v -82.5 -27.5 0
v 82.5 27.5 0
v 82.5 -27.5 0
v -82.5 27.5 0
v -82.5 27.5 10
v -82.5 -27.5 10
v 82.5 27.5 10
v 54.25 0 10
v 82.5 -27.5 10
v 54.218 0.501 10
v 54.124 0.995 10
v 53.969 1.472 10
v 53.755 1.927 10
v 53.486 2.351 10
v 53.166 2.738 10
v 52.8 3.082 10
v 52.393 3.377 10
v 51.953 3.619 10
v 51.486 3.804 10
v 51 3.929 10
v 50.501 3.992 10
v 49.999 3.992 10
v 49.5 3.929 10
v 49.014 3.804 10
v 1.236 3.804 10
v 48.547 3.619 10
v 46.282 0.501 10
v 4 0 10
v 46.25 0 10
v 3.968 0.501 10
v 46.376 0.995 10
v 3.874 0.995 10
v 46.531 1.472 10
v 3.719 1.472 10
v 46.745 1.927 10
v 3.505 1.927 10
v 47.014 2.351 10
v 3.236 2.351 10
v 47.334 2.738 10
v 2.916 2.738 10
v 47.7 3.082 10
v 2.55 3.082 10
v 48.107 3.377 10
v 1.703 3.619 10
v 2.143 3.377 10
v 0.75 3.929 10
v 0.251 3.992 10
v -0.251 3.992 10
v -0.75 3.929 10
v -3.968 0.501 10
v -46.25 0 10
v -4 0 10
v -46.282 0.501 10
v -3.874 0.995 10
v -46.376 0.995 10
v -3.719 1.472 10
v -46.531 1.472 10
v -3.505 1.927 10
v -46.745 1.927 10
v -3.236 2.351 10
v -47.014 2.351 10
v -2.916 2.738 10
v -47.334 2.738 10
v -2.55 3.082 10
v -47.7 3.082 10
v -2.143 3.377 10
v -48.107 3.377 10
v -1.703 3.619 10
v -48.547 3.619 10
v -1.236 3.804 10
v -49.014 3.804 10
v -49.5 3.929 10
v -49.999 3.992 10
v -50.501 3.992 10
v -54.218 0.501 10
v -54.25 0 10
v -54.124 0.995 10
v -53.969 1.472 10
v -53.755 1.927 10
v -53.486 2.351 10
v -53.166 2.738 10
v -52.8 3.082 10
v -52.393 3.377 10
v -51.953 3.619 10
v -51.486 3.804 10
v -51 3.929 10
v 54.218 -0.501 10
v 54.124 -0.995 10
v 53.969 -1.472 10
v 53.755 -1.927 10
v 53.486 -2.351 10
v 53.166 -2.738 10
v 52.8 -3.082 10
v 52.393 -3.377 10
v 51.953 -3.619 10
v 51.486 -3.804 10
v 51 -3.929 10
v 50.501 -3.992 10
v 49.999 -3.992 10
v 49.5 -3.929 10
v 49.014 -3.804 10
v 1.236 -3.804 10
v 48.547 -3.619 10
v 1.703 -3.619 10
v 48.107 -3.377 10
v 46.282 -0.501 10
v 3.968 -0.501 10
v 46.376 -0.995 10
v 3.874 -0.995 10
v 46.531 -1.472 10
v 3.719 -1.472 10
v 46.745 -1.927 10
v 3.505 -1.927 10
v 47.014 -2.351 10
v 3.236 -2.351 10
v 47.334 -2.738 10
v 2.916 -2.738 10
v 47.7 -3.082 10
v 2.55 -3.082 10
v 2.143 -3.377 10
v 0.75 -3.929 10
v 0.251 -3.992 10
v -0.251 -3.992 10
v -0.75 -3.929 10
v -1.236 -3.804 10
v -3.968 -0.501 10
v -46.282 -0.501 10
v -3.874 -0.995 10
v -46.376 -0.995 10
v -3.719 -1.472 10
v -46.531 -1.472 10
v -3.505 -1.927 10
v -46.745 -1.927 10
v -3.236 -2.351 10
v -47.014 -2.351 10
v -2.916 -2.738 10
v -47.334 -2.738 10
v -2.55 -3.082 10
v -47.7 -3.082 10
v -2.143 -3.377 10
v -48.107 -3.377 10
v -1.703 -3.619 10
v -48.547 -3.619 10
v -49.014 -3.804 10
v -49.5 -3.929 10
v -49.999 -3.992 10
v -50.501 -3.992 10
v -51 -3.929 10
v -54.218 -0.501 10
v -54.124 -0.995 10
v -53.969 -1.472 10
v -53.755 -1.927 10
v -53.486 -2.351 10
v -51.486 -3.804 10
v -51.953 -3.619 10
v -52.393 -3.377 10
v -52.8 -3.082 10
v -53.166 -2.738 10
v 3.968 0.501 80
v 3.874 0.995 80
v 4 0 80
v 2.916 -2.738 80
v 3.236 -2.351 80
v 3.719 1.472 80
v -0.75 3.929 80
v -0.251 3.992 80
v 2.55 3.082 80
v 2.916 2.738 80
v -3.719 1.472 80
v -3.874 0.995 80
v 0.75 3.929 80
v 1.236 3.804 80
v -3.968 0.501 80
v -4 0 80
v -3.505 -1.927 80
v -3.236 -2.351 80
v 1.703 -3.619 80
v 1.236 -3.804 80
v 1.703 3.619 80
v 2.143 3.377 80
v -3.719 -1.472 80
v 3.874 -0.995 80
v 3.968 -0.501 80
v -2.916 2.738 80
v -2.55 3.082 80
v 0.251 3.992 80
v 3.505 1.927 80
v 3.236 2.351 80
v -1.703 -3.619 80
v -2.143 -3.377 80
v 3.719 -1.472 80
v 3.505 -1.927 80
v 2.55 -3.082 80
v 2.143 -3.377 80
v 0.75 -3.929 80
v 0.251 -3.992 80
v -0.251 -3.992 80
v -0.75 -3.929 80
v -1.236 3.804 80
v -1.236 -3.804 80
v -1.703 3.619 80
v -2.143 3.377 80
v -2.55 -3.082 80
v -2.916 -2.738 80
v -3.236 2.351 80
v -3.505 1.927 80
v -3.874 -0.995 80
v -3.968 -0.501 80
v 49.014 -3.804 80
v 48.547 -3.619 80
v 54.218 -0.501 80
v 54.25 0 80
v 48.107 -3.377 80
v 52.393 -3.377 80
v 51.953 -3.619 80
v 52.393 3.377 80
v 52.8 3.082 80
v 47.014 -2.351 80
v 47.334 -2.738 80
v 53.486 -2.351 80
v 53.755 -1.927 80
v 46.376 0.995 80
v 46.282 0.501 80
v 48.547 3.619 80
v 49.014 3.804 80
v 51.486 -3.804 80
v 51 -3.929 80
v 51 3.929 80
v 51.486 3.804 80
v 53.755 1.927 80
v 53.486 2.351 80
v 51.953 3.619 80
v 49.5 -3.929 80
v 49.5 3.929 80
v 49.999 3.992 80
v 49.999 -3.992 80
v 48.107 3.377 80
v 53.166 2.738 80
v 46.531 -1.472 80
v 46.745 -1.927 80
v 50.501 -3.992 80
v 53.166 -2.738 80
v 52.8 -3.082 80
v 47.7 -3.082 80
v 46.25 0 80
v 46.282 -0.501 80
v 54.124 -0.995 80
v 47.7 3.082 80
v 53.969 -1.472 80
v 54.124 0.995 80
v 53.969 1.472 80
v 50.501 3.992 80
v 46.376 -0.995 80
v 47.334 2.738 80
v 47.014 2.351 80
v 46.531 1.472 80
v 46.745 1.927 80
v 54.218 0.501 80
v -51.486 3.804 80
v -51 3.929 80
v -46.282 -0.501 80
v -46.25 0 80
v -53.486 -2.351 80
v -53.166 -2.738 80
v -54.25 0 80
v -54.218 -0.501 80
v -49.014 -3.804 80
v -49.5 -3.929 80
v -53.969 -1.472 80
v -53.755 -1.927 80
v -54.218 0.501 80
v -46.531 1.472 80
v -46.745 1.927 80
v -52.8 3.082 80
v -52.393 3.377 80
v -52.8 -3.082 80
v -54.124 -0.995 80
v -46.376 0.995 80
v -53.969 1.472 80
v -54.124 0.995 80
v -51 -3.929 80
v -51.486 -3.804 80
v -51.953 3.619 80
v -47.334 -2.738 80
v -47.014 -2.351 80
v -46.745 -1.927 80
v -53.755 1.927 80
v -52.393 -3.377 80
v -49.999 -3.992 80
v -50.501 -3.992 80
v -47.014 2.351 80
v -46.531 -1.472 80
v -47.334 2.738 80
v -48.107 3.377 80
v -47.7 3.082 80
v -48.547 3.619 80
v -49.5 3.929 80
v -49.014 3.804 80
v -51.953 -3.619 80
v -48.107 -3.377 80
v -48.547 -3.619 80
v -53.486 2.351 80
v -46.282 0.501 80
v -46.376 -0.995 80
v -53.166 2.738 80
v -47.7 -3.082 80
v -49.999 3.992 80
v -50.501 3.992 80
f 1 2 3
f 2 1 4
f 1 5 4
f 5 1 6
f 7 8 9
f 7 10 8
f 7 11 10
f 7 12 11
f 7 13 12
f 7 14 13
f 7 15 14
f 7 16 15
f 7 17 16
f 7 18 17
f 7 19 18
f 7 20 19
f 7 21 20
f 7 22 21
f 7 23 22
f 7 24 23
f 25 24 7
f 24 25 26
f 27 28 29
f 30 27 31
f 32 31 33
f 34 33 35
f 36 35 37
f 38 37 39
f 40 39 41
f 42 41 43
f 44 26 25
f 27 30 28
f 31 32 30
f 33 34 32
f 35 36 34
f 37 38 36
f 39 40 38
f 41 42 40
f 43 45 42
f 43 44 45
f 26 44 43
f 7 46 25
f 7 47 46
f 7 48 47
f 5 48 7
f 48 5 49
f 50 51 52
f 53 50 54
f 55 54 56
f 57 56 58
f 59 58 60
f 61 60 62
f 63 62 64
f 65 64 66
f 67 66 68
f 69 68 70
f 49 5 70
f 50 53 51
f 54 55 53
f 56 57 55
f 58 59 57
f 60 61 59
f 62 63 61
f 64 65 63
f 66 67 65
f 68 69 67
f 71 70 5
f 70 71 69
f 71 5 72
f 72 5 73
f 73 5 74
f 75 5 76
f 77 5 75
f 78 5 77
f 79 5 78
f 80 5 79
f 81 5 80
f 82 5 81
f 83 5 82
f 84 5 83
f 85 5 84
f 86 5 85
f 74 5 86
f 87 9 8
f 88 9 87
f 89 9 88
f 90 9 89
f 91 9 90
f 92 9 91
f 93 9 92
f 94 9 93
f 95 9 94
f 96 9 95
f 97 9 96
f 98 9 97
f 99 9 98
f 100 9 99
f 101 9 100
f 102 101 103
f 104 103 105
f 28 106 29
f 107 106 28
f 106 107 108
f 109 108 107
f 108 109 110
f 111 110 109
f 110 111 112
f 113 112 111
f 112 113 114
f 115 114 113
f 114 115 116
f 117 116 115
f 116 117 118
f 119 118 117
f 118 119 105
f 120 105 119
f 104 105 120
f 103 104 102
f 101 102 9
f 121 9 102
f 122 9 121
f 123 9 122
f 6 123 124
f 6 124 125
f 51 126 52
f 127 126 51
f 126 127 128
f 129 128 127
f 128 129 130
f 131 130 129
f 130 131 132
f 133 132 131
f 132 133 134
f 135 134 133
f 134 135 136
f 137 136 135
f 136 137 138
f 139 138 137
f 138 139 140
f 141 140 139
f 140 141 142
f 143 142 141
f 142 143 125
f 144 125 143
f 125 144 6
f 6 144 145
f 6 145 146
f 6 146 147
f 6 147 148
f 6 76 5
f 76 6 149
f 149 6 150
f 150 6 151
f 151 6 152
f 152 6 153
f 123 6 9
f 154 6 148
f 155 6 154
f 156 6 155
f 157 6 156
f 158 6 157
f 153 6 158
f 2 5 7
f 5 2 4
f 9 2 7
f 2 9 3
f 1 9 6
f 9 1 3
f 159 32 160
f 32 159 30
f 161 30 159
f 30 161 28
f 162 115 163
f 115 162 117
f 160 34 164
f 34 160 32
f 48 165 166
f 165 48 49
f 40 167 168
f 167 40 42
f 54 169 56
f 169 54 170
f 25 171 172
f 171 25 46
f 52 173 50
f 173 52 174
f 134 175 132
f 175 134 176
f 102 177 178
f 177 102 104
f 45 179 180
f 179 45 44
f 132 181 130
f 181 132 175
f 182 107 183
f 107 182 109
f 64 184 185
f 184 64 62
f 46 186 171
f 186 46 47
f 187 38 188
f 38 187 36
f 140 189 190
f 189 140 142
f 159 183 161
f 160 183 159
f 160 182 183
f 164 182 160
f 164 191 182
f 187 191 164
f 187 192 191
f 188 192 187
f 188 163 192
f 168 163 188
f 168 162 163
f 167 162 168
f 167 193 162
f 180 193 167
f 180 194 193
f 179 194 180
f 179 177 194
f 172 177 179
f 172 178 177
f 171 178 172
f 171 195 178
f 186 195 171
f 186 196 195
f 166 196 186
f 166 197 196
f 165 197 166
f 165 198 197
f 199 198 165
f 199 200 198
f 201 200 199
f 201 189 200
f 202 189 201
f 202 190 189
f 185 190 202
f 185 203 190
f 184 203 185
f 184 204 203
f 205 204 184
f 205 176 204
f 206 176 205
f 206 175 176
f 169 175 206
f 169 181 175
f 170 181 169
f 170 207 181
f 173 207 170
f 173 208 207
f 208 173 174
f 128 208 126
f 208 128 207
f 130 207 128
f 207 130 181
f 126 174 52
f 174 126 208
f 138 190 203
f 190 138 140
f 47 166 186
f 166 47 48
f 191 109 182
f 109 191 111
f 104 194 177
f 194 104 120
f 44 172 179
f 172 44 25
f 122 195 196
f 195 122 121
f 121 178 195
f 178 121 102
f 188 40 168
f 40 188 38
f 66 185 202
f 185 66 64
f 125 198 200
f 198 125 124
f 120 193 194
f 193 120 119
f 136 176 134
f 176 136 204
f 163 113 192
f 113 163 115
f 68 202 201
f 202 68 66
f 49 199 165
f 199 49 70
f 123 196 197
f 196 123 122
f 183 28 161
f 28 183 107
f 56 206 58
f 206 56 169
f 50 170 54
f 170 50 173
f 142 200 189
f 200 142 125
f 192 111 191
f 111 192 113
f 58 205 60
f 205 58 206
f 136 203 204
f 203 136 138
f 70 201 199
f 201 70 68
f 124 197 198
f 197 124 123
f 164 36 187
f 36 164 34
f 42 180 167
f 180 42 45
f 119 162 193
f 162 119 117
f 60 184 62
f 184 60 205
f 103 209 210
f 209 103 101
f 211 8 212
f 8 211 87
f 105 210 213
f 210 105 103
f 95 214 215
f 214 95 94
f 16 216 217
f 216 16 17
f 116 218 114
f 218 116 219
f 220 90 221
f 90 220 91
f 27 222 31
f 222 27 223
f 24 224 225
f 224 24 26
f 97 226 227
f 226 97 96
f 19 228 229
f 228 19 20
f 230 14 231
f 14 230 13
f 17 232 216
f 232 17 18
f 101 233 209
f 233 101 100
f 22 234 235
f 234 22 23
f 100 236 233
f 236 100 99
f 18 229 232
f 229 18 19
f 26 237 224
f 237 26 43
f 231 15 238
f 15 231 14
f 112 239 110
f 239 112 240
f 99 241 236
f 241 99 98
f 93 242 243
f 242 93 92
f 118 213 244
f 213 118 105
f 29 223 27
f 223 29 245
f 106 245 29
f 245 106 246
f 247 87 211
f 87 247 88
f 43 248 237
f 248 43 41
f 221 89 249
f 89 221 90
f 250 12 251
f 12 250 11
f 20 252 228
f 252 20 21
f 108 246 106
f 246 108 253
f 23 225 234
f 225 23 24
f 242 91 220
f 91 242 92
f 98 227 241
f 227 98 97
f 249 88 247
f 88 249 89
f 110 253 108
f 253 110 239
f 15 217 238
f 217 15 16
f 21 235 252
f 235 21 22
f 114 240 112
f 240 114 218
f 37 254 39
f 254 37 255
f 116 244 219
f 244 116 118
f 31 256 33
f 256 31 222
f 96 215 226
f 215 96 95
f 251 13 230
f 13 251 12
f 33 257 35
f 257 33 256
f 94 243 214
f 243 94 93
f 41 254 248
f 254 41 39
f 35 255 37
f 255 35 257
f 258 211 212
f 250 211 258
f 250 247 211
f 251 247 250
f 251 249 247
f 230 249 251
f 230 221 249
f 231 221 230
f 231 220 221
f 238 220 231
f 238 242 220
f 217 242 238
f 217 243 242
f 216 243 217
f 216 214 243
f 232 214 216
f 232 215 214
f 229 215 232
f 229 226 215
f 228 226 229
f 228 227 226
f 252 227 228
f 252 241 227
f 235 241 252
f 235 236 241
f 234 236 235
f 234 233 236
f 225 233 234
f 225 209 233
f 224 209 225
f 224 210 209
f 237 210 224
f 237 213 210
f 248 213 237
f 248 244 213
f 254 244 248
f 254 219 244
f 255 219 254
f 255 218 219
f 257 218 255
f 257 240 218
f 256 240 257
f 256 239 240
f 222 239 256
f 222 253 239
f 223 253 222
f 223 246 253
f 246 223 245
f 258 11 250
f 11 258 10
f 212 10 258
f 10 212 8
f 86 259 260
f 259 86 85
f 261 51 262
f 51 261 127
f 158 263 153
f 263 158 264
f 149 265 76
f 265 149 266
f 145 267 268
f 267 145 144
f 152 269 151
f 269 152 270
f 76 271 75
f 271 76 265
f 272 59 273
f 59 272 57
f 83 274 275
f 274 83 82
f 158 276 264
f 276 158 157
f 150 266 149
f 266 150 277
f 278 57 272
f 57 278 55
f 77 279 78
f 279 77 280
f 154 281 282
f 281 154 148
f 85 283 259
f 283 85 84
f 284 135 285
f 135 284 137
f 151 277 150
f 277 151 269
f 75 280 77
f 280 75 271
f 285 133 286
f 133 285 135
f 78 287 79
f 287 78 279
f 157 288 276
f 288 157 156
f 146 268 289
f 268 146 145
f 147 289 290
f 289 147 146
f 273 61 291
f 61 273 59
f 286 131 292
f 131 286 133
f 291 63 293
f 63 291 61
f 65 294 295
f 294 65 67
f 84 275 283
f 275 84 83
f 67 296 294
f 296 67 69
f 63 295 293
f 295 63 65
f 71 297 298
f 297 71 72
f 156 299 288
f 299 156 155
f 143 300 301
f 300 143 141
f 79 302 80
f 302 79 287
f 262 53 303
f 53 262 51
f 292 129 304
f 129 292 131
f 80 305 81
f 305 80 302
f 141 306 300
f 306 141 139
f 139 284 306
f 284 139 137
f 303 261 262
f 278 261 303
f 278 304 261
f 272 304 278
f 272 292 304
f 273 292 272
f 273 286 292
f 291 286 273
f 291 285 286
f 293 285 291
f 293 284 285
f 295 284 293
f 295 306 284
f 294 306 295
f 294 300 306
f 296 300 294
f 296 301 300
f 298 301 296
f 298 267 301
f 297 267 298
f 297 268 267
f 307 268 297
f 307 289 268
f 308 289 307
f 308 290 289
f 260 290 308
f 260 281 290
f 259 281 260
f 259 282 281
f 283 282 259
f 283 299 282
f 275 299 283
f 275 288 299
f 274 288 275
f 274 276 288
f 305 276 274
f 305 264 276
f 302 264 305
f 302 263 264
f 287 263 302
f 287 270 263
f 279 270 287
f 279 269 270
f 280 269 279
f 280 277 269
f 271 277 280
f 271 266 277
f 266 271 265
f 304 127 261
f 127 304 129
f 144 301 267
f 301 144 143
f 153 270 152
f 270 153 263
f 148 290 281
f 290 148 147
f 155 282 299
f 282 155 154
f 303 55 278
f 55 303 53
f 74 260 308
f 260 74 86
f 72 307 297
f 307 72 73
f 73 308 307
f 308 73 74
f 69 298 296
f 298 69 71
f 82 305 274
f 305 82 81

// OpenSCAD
/// Base
translate([0,0,5]);
linear_extrude(height = 10, center = false, convexity = 0, twist = 0, $fn = 10)
square(size = [165, 55], center = true);

// Pino do meio
linear_extrude(height = 80, center = false, convexity = 0, twist = 0, $fn = 10)
translate([0,0,0])
circle(d=8, $fn = 50, $fa = 10, $fs = 10);

// Pino da direita
linear_extrude(height = 80, center = false, convexity = 0, twist = 0, $fn = 10)
translate([50.250,0,0])
circle(d=8, $fn = 50, $fa = 10, $fs = 10);

// Pino da esquerda
linear_extrude(height = 80, center = false, convexity = 0, twist = 0, $fn = 10)
translate([-50.250,0,0])
circle(d=8, $fn = 50, $fa = 10, $fs = 10);
